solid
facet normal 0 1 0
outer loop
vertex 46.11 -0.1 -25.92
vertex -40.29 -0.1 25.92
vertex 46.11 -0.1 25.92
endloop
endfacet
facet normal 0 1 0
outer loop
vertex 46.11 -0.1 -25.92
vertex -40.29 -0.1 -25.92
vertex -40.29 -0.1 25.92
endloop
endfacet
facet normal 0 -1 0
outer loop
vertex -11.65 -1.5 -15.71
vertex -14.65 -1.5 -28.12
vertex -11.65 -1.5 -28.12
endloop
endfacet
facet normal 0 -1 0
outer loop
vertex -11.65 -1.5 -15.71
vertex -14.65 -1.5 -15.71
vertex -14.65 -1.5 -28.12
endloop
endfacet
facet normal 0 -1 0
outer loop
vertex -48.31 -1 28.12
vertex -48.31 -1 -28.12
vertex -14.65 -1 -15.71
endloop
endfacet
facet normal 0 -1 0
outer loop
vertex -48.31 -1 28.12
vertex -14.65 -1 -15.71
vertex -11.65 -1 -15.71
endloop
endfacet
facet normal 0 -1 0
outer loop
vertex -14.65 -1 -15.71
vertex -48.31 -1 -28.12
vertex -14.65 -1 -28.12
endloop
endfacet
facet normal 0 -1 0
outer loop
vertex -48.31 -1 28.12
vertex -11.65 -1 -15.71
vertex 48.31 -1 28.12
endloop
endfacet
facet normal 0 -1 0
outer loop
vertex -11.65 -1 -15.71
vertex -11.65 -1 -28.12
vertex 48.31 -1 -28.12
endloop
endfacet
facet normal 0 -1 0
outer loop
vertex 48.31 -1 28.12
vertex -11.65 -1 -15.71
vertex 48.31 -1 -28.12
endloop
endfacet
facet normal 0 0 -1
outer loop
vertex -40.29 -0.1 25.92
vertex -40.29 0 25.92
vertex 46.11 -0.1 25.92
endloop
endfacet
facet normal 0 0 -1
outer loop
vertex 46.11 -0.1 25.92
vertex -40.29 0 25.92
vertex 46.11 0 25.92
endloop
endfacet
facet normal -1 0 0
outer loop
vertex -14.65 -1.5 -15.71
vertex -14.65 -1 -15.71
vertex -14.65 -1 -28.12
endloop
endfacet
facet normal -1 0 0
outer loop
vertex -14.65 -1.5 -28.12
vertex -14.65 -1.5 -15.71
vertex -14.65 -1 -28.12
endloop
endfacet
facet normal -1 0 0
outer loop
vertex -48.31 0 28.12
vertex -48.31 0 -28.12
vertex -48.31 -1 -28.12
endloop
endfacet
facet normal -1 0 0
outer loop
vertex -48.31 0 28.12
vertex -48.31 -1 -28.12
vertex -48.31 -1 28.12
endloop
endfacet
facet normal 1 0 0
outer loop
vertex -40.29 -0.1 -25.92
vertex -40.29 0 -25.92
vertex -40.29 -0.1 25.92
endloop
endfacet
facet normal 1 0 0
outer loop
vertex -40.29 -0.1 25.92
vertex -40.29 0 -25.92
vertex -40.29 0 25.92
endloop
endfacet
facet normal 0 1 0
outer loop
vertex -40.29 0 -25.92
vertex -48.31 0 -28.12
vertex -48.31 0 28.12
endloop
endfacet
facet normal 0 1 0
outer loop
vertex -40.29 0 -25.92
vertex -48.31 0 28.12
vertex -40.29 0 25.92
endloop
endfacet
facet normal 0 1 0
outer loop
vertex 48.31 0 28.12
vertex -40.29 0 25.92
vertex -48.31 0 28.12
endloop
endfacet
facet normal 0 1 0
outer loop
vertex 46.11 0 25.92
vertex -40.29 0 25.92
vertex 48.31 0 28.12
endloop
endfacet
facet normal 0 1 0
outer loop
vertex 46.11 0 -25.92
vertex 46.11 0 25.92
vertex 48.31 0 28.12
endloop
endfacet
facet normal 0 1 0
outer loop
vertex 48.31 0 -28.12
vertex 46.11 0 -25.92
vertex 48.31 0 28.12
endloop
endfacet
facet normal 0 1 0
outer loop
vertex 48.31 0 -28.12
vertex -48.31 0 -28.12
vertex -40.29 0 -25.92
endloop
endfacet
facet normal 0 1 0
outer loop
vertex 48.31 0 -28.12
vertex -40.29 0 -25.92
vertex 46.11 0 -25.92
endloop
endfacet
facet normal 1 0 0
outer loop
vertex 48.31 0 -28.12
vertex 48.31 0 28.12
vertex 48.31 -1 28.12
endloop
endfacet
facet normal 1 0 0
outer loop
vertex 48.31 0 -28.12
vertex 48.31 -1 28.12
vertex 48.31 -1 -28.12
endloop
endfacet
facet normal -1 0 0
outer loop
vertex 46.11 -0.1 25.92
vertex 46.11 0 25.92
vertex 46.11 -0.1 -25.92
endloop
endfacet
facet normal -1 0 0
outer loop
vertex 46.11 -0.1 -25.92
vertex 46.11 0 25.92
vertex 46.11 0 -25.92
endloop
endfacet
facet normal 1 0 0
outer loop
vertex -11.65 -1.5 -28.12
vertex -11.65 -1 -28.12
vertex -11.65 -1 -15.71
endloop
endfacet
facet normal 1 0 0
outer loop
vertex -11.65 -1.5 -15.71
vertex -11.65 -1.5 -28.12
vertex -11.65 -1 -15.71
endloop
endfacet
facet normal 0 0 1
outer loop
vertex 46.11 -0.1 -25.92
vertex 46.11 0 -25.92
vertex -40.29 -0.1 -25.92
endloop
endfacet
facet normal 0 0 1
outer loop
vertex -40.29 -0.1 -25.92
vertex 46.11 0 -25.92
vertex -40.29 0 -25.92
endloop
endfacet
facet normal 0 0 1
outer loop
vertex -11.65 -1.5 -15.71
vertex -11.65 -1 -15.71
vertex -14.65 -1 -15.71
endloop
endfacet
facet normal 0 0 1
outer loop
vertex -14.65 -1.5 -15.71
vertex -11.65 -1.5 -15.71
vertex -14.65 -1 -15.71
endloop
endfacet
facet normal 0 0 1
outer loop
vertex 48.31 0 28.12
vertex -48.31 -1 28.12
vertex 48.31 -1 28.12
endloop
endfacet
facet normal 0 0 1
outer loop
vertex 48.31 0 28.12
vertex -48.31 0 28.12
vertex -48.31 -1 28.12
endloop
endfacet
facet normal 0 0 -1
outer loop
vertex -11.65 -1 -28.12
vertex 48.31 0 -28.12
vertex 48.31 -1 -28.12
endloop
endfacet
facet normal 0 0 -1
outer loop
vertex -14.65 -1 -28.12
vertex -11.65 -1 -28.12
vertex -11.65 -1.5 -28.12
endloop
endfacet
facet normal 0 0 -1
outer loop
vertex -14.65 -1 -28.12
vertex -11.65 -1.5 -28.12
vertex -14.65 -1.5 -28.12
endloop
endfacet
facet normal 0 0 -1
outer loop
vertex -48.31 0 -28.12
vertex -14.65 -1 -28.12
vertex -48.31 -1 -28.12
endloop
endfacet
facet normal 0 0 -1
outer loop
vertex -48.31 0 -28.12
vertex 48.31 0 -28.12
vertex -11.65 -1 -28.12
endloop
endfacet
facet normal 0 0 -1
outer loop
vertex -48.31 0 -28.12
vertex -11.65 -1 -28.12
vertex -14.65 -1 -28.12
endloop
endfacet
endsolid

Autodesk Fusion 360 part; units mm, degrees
sketch "Sketch1" plane through (0, 0, 0) normal (0, 1, 0) x (1, 0, 0)
  line L0 (48.31, 28.12) -> (-48.31, 28.12)
  line L1 (-48.31, 28.12) -> (-48.31, -28.12)
  line L2 (-48.31, -28.12) -> (48.31, -28.12)
  line L3 (48.31, -28.12) -> (48.31, 28.12)
  line L4 (48.31, 28.12) -> (-48.31, -28.12) construction
  line L5 (-48.31, 28.12) -> (48.31, -28.12) construction
  line L6 (46.11, 25.92) -> (-40.29, 25.92)
  line L7 (-40.29, 25.92) -> (-40.29, -25.92)
  line L8 (-40.29, -25.92) -> (46.11, -25.92)
  line L9 (46.11, -25.92) -> (46.11, 25.92)
  line L10 (46.11, 25.92) -> (-40.29, -25.92) construction
  line L11 (-40.29, 25.92) -> (46.11, -25.92) construction
  point P0 (4.4468, -0.9221)
  dimension "d193" = 96.62
  dimension "d194" = 56.24
  dimension "d195" = 86.4
  dimension "d196" = 51.84
  dimension "d197" = 2.2
  dimension "d198" = 2.2
extrude "Extrude1" add sketch "Sketch1" against normal blind 1 contours L0 L1 L2 L3 | L6 L7 L8 L9
extrude "Extrude2" cut sketch "Sketch1" against normal blind 0.1 contours L6 L7 L8 L9
sketch "Sketch3" plane through (0, -1, 0) normal (0, -1, 0) x (1, 0, 0)
  line L0 (48.31, -28.12) -> (48.31, 28.12)
  line L1 (48.31, 28.12) -> (-48.31, 28.12)
  line L2 (-48.31, 28.12) -> (-48.31, -28.12)
  line L3 (-48.31, -28.12) -> (48.31, -28.12)
  line L4 (-14.65, -28.21) -> (-11.65, -28.21)
  line L5 (-11.65, -28.21) -> (-11.65, -15.71)
  line L6 (-11.65, -15.71) -> (-14.65, -15.71)
  line L7 (-14.65, -15.71) -> (-14.65, -28.21)
  line L8 (-14.65, -28.21) -> (-11.65, -15.71) construction
  line L9 (-11.65, -28.21) -> (-14.65, -15.71) construction
  line L10 (-48.31, 28.12) -> (48.31, 28.12)
  line L11 (-48.31, -28.12) -> (-48.31, 28.12)
  point P0 (-13.15, -21.96)
  dimension "d1" = 3
  dimension "d2" = 12.5
  dimension "d3" = 43.83
  dimension "d4" = 33.66
extrude "Extrude3" add sketch "Sketch3" along normal blind 0.5 contours L3 L5 L6 L7
